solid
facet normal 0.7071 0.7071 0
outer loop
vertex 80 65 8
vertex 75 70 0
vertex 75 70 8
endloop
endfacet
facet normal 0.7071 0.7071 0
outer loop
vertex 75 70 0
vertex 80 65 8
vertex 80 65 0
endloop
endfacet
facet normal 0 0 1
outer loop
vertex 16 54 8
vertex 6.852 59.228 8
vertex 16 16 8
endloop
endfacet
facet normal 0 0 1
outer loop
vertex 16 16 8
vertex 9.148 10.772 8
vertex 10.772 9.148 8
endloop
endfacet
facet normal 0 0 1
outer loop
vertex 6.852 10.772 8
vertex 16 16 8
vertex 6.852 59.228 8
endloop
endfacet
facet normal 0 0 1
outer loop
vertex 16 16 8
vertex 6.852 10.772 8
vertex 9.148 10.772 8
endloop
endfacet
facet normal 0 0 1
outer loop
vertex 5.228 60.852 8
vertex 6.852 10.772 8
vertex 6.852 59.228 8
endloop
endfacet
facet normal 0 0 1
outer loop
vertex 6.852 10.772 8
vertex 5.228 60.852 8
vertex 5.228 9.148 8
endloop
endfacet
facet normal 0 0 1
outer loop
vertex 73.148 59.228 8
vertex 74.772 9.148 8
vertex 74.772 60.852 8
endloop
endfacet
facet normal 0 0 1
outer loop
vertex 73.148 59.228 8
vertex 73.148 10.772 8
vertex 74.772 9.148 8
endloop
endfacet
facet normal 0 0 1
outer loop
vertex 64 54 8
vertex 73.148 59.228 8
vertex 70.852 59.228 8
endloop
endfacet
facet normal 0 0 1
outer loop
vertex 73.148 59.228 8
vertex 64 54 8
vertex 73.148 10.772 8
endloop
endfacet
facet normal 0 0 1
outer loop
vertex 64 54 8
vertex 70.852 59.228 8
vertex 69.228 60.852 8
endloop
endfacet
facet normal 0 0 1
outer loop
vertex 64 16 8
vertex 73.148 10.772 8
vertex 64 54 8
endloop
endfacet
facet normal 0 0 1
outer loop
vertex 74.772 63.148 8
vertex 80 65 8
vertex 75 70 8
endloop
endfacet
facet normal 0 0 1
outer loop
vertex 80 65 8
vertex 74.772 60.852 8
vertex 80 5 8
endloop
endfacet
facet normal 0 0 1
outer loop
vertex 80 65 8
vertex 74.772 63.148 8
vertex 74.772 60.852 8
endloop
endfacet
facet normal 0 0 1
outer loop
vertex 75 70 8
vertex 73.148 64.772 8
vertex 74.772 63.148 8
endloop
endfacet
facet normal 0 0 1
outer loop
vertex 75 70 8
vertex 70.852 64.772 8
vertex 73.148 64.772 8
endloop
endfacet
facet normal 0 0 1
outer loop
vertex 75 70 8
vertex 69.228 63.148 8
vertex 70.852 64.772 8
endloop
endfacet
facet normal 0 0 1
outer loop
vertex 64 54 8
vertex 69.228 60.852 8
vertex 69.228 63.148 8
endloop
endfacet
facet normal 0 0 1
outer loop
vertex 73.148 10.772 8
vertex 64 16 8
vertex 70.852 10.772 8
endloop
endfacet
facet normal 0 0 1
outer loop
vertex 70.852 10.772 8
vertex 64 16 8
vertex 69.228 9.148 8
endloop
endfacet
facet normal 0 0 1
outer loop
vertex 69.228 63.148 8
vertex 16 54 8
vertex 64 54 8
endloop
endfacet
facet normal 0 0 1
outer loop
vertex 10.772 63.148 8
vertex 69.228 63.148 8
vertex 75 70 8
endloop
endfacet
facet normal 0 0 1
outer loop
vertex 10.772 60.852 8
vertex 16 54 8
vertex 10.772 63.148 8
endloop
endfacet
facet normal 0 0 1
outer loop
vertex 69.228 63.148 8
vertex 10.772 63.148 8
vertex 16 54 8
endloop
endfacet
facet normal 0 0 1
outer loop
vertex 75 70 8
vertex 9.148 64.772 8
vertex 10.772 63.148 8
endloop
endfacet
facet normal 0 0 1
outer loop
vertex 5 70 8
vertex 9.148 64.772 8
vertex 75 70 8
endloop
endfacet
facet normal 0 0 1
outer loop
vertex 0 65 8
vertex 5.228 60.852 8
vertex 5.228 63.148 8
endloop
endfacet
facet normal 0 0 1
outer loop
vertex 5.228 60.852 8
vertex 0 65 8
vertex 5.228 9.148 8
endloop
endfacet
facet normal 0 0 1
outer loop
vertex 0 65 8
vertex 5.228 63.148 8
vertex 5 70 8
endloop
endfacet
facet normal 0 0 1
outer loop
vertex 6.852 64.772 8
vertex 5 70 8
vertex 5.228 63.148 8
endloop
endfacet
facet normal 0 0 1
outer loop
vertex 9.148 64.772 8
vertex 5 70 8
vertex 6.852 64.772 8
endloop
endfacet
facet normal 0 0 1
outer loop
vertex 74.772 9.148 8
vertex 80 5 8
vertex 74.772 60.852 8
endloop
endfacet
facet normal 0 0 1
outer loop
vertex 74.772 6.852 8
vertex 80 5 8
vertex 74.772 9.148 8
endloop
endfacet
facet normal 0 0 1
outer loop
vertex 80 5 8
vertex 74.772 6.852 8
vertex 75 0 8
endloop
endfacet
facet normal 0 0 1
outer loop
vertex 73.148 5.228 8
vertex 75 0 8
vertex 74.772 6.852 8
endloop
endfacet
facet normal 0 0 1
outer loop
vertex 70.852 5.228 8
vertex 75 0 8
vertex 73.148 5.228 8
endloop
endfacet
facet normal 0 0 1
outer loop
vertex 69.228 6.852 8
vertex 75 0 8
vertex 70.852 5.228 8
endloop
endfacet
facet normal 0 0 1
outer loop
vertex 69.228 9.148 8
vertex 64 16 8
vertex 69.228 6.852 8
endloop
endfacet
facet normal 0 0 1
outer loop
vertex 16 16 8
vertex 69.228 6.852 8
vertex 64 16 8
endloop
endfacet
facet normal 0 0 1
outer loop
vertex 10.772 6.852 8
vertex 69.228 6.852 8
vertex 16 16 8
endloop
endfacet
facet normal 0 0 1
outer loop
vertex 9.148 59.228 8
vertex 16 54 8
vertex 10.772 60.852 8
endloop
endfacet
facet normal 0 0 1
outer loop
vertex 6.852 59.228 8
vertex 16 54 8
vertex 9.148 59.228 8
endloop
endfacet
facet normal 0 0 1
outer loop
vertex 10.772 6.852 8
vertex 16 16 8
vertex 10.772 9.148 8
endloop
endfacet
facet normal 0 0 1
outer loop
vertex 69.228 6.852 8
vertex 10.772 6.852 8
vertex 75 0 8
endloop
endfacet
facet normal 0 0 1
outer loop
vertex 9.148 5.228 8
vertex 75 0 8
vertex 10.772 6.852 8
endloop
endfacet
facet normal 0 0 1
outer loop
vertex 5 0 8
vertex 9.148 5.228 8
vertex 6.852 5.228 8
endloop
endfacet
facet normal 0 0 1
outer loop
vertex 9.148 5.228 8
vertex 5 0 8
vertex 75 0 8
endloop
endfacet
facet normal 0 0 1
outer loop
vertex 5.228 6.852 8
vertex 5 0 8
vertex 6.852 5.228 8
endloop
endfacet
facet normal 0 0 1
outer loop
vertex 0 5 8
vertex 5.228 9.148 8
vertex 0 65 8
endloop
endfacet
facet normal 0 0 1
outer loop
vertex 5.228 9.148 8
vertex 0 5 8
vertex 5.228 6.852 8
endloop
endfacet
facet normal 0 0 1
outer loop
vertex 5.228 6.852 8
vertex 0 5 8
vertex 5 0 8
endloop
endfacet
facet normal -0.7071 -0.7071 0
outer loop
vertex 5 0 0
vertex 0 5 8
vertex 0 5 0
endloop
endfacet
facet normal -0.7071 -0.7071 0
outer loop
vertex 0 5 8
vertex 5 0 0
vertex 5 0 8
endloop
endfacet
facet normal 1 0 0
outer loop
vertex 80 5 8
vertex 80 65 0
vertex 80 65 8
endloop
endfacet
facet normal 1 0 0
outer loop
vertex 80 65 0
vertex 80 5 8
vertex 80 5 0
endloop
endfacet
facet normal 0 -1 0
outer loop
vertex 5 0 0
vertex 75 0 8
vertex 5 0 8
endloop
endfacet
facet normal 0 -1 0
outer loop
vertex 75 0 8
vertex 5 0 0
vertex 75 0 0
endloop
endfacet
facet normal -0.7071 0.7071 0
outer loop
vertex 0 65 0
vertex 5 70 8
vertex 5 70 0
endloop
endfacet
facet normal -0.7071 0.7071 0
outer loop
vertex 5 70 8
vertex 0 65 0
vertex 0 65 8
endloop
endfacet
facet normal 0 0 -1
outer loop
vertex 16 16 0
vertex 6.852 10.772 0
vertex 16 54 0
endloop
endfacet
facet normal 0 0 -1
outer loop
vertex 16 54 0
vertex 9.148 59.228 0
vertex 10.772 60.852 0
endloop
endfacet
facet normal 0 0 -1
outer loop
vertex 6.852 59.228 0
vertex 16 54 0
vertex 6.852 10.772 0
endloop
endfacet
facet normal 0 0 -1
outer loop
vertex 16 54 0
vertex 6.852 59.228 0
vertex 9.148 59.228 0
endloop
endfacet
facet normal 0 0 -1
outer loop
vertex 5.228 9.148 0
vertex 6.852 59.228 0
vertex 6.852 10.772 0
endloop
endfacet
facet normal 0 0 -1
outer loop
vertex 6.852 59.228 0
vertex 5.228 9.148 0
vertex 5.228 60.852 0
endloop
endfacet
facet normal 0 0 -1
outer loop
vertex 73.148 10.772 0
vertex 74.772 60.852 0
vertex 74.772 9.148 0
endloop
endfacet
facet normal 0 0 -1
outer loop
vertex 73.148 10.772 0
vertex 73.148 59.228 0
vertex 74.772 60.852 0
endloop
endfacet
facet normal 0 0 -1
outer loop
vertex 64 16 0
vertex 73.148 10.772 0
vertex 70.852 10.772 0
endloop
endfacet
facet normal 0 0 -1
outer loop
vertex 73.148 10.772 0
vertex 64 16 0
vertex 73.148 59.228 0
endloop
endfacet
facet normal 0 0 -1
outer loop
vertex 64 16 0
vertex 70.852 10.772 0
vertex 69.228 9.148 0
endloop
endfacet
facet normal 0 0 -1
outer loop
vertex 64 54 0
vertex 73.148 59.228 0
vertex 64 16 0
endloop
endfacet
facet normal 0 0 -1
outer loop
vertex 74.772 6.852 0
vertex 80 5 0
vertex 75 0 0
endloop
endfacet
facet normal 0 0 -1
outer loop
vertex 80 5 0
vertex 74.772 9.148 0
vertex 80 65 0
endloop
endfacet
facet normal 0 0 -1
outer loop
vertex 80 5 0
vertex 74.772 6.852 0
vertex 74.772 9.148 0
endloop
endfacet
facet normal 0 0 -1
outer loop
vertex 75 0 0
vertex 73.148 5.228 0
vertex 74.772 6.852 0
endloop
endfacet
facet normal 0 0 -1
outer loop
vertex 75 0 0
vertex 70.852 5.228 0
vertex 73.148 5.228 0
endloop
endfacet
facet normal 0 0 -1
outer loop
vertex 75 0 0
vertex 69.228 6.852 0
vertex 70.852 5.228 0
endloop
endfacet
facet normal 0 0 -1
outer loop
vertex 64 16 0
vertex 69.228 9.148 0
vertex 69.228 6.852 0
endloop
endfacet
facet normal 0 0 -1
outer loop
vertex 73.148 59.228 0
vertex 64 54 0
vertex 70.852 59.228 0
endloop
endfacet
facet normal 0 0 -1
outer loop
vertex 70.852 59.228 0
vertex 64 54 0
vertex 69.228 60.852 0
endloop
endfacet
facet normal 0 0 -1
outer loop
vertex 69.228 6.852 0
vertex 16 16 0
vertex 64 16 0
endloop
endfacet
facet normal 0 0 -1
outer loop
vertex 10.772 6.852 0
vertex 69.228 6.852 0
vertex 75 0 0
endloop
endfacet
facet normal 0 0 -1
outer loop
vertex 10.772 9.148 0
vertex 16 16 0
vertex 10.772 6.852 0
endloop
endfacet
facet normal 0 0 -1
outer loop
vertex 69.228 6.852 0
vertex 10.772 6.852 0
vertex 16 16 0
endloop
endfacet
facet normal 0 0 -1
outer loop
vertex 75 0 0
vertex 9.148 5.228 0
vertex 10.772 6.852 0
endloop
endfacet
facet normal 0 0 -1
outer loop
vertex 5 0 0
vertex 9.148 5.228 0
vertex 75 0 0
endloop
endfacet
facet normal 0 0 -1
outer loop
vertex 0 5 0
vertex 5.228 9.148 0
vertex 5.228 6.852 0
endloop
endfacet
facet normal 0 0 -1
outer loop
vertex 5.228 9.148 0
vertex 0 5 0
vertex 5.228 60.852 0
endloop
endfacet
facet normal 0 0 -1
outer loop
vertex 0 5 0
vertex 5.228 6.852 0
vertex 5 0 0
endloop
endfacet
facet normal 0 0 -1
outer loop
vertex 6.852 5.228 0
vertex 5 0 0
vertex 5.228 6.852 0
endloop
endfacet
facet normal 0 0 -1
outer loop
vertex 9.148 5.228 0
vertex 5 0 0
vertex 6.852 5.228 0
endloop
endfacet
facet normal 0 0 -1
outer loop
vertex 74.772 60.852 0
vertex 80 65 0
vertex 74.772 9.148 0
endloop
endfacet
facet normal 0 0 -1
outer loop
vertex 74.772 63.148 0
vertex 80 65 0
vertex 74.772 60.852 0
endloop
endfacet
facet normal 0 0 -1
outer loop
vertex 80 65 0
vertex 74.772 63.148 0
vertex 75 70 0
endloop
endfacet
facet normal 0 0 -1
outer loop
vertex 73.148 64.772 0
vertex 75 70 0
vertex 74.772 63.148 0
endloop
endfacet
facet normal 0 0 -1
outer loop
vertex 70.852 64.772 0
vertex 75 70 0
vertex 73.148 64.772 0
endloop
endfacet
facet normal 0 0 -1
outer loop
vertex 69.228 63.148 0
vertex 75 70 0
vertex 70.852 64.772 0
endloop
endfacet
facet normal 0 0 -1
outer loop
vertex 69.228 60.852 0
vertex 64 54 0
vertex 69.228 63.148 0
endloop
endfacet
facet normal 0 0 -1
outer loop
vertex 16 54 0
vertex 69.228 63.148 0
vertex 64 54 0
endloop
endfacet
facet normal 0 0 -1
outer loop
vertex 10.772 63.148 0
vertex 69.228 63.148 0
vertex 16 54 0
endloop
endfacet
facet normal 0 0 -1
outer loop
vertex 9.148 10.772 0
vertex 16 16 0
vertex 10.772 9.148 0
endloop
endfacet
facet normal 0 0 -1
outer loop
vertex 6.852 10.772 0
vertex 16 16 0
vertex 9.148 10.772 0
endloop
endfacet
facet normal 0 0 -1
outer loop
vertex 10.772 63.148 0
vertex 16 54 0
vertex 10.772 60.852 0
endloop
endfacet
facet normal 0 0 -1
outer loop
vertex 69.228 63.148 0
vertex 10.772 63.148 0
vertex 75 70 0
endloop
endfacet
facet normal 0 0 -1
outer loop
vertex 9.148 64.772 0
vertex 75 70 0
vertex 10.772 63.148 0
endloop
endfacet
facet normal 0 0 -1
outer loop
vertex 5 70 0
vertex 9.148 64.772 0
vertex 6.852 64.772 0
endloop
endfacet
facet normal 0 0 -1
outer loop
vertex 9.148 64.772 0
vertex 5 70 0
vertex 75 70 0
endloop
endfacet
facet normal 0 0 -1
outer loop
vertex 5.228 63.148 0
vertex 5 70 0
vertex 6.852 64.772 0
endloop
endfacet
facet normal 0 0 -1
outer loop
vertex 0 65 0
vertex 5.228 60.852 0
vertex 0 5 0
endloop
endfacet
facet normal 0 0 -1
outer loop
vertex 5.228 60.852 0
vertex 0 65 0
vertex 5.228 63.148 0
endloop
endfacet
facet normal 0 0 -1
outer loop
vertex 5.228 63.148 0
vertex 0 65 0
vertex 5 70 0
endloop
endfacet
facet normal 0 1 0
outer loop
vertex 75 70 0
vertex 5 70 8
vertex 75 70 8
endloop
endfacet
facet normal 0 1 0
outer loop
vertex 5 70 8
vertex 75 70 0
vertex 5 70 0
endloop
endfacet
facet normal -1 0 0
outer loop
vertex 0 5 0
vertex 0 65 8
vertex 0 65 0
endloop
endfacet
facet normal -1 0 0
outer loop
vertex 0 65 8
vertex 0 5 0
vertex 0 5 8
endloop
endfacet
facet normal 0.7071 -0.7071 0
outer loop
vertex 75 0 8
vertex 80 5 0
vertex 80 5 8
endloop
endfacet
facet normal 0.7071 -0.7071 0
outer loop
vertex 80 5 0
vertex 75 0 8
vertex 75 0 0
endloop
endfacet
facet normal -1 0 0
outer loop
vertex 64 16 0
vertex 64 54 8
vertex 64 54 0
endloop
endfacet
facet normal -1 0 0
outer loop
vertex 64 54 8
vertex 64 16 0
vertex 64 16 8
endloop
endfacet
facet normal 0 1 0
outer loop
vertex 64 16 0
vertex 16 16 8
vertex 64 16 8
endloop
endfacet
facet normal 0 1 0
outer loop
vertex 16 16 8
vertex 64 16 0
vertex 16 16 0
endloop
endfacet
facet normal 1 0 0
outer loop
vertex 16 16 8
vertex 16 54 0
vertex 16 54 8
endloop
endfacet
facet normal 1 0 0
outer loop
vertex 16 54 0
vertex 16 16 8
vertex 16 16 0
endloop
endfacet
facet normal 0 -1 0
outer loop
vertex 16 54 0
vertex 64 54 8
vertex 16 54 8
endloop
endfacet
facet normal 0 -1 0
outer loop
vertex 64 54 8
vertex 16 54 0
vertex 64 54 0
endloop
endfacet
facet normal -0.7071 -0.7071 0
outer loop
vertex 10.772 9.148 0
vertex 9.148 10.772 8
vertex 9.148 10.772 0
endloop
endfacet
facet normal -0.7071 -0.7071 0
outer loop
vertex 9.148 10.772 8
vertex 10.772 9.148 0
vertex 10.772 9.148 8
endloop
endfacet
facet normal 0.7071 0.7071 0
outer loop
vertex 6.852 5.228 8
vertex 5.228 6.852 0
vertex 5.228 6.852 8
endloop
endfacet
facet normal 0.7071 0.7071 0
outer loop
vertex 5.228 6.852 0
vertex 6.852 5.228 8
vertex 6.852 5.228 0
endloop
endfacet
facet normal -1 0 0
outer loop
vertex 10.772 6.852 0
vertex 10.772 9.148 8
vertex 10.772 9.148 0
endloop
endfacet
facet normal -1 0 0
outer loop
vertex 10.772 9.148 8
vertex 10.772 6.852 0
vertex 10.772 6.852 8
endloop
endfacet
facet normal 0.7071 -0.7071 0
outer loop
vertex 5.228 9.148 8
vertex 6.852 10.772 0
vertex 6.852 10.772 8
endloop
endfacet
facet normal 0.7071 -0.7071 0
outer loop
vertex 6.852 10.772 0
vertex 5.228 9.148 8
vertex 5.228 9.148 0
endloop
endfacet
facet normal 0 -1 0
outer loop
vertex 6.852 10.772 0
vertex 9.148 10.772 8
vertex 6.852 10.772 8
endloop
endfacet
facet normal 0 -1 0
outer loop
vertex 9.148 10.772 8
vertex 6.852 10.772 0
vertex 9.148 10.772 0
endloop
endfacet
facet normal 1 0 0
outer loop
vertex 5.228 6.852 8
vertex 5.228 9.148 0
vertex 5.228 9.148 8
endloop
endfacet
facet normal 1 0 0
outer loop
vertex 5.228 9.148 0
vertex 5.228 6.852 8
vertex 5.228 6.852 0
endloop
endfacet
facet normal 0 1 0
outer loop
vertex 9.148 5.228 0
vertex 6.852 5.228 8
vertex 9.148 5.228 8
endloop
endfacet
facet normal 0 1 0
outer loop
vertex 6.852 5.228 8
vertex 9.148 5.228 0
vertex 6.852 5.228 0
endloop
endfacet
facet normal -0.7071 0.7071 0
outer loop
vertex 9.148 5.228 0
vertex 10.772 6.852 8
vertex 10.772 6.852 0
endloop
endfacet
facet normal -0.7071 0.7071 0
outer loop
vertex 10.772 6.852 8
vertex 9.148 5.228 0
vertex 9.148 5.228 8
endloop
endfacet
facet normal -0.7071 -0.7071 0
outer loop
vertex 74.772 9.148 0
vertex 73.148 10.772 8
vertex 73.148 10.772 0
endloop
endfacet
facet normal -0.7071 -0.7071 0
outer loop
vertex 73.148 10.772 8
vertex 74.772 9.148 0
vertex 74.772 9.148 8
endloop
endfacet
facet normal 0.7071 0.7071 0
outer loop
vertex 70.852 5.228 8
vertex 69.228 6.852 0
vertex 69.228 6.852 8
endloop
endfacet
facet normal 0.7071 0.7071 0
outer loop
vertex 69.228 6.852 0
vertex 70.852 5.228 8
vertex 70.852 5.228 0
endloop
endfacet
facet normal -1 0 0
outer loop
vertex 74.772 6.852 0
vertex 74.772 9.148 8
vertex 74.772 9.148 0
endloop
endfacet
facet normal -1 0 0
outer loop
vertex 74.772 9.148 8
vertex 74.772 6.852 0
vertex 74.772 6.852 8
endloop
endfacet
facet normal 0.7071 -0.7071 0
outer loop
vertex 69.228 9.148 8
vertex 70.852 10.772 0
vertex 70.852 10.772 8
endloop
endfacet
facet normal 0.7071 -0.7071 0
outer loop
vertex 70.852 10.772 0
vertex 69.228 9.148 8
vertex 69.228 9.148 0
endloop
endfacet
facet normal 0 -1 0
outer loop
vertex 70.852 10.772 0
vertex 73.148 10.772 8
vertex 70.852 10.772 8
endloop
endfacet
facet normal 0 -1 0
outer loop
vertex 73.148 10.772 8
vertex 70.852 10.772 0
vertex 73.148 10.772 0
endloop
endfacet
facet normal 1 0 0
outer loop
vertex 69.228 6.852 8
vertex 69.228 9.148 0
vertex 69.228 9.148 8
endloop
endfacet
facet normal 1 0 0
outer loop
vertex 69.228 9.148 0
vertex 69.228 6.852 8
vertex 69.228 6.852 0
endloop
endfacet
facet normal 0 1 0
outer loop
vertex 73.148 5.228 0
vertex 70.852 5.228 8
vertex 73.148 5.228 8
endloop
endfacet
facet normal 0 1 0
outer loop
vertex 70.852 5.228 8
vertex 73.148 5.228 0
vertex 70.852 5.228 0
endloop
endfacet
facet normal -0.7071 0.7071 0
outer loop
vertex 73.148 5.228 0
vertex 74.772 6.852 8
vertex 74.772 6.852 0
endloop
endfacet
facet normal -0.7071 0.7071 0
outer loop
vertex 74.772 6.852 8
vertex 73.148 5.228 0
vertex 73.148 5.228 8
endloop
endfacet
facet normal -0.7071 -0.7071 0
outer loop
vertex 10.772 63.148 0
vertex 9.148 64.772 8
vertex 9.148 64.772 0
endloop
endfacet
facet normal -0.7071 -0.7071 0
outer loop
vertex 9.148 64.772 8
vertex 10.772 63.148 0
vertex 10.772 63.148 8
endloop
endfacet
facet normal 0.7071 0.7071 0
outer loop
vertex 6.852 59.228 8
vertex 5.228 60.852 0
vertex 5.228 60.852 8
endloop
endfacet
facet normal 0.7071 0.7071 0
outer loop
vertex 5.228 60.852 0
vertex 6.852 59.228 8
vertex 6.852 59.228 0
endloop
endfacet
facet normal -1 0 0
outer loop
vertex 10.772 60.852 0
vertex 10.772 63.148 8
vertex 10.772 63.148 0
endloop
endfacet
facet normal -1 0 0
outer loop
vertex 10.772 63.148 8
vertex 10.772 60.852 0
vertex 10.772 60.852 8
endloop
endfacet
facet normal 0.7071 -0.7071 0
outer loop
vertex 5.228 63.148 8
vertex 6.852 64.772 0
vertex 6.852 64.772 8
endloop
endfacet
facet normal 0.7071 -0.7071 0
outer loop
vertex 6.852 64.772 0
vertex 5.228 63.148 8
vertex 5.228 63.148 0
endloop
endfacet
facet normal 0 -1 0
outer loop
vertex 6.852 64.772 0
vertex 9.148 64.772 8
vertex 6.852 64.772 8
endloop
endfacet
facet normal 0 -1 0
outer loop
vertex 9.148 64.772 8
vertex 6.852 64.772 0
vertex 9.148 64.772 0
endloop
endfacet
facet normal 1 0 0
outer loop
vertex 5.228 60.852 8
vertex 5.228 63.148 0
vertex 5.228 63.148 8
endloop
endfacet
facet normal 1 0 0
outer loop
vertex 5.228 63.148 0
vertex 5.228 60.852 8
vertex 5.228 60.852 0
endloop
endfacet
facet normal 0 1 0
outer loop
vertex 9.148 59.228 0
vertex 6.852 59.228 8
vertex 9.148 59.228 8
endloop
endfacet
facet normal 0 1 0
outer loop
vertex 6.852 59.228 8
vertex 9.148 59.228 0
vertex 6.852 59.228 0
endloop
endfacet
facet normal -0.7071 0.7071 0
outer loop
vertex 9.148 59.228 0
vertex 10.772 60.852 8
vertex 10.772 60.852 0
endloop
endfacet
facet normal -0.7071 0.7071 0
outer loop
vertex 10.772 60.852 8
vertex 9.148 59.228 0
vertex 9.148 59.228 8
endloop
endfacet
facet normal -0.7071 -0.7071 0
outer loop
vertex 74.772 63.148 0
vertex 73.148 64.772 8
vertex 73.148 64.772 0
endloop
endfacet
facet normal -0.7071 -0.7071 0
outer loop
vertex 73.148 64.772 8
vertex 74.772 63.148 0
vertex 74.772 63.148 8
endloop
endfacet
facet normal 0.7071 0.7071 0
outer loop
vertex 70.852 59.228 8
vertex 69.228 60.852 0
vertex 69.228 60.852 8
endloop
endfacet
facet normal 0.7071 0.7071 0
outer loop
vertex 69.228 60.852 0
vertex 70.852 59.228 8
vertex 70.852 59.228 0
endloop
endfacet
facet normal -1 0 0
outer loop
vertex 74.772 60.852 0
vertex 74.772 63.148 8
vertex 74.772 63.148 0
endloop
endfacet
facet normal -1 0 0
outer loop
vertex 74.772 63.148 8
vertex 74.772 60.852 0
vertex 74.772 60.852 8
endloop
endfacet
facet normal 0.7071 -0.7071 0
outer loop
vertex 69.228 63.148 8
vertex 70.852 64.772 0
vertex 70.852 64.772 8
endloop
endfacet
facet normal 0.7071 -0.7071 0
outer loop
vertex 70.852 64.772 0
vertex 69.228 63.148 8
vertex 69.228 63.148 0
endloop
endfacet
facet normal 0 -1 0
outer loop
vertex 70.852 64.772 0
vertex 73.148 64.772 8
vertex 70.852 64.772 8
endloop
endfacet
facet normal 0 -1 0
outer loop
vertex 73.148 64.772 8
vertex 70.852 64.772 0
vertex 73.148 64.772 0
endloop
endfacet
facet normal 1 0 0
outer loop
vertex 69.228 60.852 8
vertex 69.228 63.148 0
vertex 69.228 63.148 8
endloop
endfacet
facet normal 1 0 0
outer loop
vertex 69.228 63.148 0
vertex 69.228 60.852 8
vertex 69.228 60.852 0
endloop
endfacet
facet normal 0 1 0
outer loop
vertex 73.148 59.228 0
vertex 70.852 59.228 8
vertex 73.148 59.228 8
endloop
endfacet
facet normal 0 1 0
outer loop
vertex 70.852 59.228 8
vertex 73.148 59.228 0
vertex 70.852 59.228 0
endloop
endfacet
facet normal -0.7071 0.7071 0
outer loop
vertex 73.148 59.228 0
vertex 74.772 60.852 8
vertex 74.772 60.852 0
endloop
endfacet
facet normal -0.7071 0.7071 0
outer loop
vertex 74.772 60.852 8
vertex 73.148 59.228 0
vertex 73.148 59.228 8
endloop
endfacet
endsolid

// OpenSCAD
$fn = 32;

// ----------------------------------------------------------------------
// Frame plate: 80 x 70 frame, 16 mm rails
// ----------------------------------------------------------------------

// --- parameters (mm) ---
plate_l = 80;             // plate length, X
plate_w = 70;             // plate width, Y
plate_t = 8;              // plate thickness, Z (extrusion height)
corner_c = 5;             // corner chamfer
frame_bar = 16;           // frame rail width
bolt_r = 3;               // corner bolt window radius
bolt_inset = 8;           // bolt centre inset from the edges

win_l = plate_l - 2 * frame_bar;  // window length
win_w = plate_w - 2 * frame_bar;  // window width
bolt_d = 2 * bolt_r;  // corner hole diameter

profile = [[5, 0], [75, 0], [80, 5], [80, 65], [75, 70], [5, 70], [0, 65], [0, 5]];  // primary outline, 8 points, counter clockwise
void_1 = [[16, 16], [64, 16], [64, 54], [16, 54]];  // the window, 4 points
void_2 = [[10.772, 9.148], [9.148, 10.772], [6.852, 10.772], [5.228, 9.148], [5.228, 6.852], [6.852, 5.228], [9.148, 5.228], [10.772, 6.852]];  // corner bolt window, 8 points
void_3 = [[74.772, 9.148], [73.148, 10.772], [70.852, 10.772], [69.228, 9.148], [69.228, 6.852], [70.852, 5.228], [73.148, 5.228], [74.772, 6.852]];  // corner bolt window, 8 points
void_4 = [[10.772, 63.148], [9.148, 64.772], [6.852, 64.772], [5.228, 63.148], [5.228, 60.852], [6.852, 59.228], [9.148, 59.228], [10.772, 60.852]];  // corner bolt window, 8 points
void_5 = [[74.772, 63.148], [73.148, 64.772], [70.852, 64.772], [69.228, 63.148], [69.228, 60.852], [70.852, 59.228], [73.148, 59.228], [74.772, 60.852]];  // corner bolt window, 8 points

// --- the one profile operation ---
difference() {
  linear_extrude(height = plate_t) polygon(points = profile);
  translate([0, 0, -1])
    linear_extrude(height = plate_t + 2) polygon(points = void_1);
  translate([0, 0, -1])
    linear_extrude(height = plate_t + 2) polygon(points = void_2);
  translate([0, 0, -1])
    linear_extrude(height = plate_t + 2) polygon(points = void_3);
  translate([0, 0, -1])
    linear_extrude(height = plate_t + 2) polygon(points = void_4);
  translate([0, 0, -1])
    linear_extrude(height = plate_t + 2) polygon(points = void_5);
}
